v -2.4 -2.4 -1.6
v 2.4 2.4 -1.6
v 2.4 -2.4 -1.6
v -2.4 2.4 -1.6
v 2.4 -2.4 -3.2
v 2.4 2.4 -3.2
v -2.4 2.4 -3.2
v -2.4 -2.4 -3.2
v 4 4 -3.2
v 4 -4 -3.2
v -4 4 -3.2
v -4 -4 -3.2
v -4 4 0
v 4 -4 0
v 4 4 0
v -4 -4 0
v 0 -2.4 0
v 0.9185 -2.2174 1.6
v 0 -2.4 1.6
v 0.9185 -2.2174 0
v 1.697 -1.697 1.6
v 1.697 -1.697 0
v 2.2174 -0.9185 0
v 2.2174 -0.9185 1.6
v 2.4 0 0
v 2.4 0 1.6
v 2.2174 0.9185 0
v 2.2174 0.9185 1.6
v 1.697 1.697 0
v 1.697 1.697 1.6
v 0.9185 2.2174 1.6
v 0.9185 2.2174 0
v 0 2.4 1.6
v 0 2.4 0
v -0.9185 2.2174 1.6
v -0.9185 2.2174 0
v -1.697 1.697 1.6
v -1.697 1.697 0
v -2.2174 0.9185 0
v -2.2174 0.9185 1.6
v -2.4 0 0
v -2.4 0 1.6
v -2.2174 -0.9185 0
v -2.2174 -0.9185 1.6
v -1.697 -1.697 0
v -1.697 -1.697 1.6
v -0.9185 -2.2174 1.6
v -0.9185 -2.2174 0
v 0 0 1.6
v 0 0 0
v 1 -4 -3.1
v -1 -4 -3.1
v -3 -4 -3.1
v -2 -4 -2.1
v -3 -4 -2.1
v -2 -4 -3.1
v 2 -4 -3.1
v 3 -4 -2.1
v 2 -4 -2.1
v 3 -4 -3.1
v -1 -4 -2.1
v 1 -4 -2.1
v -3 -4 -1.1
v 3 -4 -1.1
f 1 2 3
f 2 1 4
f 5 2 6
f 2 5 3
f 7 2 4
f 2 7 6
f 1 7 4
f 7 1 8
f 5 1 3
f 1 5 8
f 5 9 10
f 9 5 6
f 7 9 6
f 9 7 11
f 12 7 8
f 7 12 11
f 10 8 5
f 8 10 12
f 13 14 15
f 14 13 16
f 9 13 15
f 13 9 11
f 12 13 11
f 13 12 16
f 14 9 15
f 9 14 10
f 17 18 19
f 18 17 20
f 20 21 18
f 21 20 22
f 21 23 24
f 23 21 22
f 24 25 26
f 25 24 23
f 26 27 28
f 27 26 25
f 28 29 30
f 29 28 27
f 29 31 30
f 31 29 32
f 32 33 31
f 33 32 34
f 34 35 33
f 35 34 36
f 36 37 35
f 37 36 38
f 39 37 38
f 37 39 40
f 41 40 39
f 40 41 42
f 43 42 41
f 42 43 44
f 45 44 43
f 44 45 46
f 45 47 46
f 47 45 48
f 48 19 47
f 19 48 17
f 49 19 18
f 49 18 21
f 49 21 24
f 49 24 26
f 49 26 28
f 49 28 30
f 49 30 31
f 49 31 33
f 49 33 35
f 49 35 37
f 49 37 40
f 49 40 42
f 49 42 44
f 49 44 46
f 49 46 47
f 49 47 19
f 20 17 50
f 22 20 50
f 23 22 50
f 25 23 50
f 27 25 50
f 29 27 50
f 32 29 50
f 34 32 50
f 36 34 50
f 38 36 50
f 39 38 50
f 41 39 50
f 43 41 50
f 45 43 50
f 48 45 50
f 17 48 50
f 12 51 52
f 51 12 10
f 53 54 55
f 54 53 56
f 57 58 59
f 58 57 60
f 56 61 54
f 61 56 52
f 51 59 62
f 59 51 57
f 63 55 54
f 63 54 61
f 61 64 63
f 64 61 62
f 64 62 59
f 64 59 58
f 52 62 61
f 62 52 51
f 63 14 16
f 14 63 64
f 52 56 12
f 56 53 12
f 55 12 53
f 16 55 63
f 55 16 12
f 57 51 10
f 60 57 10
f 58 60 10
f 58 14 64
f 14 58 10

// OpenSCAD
// file: ../p/4-4edge.scad
use <../lib.scad>
function ldraw_lib__4_4edge() = [
// 0 Circle 1.0
// 0 Name: 4-4edge.dat
// 0 Author: James Jessiman
// 0 !LDRAW_ORG Primitive UPDATE 2017-01
// 0 !LICENSE Licensed under CC BY 2.0 and CC BY 4.0 : see CAreadme.txt
// 
// 0 BFC CERTIFY CCW
  [0,"BFC","CERTIFY"],
  [0,"BFC","CCW"],
// 
// 0 !HISTORY 1998-12-15 [PTadmin] Official Update 1998-10
// 0 !HISTORY 2005-12-28 [PTadmin] Official Update 2005-01
// 0 !HISTORY 2007-06-24 [PTadmin] Header formatted for Contributor Agreement
// 0 !HISTORY 2008-07-01 [PTadmin] Official Update 2008-01
// 0 !HISTORY 2017-01-15 [Steffen] BFCed
// 0 !HISTORY 2017-12-30 [PTadmin] Official Update 2017-01
// 
// 
// 2 24 1 0 0 0.9239 0 0.3827
  [2,24,1,0,0,0.9239,0,0.3827],
// 2 24 0.9239 0 0.3827 0.7071 0 0.7071
  [2,24,0.9239,0,0.3827,0.7071,0,0.7071],
// 2 24 0.7071 0 0.7071 0.3827 0 0.9239
  [2,24,0.7071,0,0.7071,0.3827,0,0.9239],
// 2 24 0.3827 0 0.9239 0 0 1
  [2,24,0.3827,0,0.9239,0,0,1],
// 2 24 0 0 1 -0.3827 0 0.9239
  [2,24,0,0,1,-0.3827,0,0.9239],
// 2 24 -0.3827 0 0.9239 -0.7071 0 0.7071
  [2,24,-0.3827,0,0.9239,-0.7071,0,0.7071],
// 2 24 -0.7071 0 0.7071 -0.9239 0 0.3827
  [2,24,-0.7071,0,0.7071,-0.9239,0,0.3827],
// 2 24 -0.9239 0 0.3827 -1 0 -0
  [2,24,-0.9239,0,0.3827,-1,0,-0],
// 2 24 -1 0 -0 -0.9239 0 -0.3827
  [2,24,-1,0,-0,-0.9239,0,-0.3827],
// 2 24 -0.9239 0 -0.3827 -0.7071 0 -0.7071
  [2,24,-0.9239,0,-0.3827,-0.7071,0,-0.7071],
// 2 24 -0.7071 0 -0.7071 -0.3827 0 -0.9239
  [2,24,-0.7071,0,-0.7071,-0.3827,0,-0.9239],
// 2 24 -0.3827 0 -0.9239 0 0 -1
  [2,24,-0.3827,0,-0.9239,0,0,-1],
// 2 24 0 0 -1 0.3827 0 -0.9239
  [2,24,0,0,-1,0.3827,0,-0.9239],
// 2 24 0.3827 0 -0.9239 0.7071 0 -0.7071
  [2,24,0.3827,0,-0.9239,0.7071,0,-0.7071],
// 2 24 0.7071 0 -0.7071 0.9239 0 -0.3827
  [2,24,0.7071,0,-0.7071,0.9239,0,-0.3827],
// 2 24 0.9239 0 -0.3827 1 0 0
  [2,24,0.9239,0,-0.3827,1,0,0],
];
module ldraw_lib__4_4edge(step=0, col=false, unit=2/5, alt=false, line=0.2, solid=!$preview)
    makepoly(ldraw_lib__4_4edge(), step=step, col=col, unit=unit, alt=alt, line=line, solid=solid);
ldraw_lib__4_4edge(line=0.2);
// file: ../p/4-4disc.scad
use <../lib.scad>
function ldraw_lib__4_4disc() = [
// 0 Disc 1.0
// 0 Name: 4-4disc.dat
// 0 Author: James Jessiman
// 0 !LDRAW_ORG Primitive UPDATE 2002-02
// 0 !LICENSE Licensed under CC BY 2.0 and CC BY 4.0 : see CAreadme.txt
// 
// 0 BFC CERTIFY CCW
  [0,"BFC","CERTIFY"],
  [0,"BFC","CCW"],
// 
// 0 !HISTORY 1998-12-15 [PTadmin] Official Update 1998-10
// 0 !HISTORY 2002-03-23 [sbliss] Added BFC statement
// 0 !HISTORY 2002-04-25 [PTadmin] Official Update 2002-02
// 0 !HISTORY 2007-06-24 [PTadmin] Header formatted for Contributor Agreement
// 0 !HISTORY 2008-07-01 [PTadmin] Official Update 2008-01
// 
// 
// 3 16 0 0 0 1 0 0 0.9239 0 0.3827
  [3,16,0,0,0,1,0,0,0.9239,0,0.3827],
// 3 16 0 0 0 0.9239 0 0.3827 0.7071 0 0.7071
  [3,16,0,0,0,0.9239,0,0.3827,0.7071,0,0.7071],
// 3 16 0 0 0 0.7071 0 0.7071 0.3827 0 0.9239
  [3,16,0,0,0,0.7071,0,0.7071,0.3827,0,0.9239],
// 3 16 0 0 0 0.3827 0 0.9239 0 0 1
  [3,16,0,0,0,0.3827,0,0.9239,0,0,1],
// 3 16 0 0 0 0 0 1 -0.3827 0 0.9239
  [3,16,0,0,0,0,0,1,-0.3827,0,0.9239],
// 3 16 0 0 0 -0.3827 0 0.9239 -0.7071 0 0.7071
  [3,16,0,0,0,-0.3827,0,0.9239,-0.7071,0,0.7071],
// 3 16 0 0 0 -0.7071 0 0.7071 -0.9239 0 0.3827
  [3,16,0,0,0,-0.7071,0,0.7071,-0.9239,0,0.3827],
// 3 16 0 0 0 -0.9239 0 0.3827 -1 0 -0
  [3,16,0,0,0,-0.9239,0,0.3827,-1,0,-0],
// 3 16 0 0 0 -1 0 -0 -0.9239 0 -0.3827
  [3,16,0,0,0,-1,0,-0,-0.9239,0,-0.3827],
// 3 16 0 0 0 -0.9239 0 -0.3827 -0.7071 0 -0.7071
  [3,16,0,0,0,-0.9239,0,-0.3827,-0.7071,0,-0.7071],
// 3 16 0 0 0 -0.7071 0 -0.7071 -0.3827 0 -0.9239
  [3,16,0,0,0,-0.7071,0,-0.7071,-0.3827,0,-0.9239],
// 3 16 0 0 0 -0.3827 0 -0.9239 0 0 -1
  [3,16,0,0,0,-0.3827,0,-0.9239,0,0,-1],
// 3 16 0 0 0 0 0 -1 0.3827 0 -0.9239
  [3,16,0,0,0,0,0,-1,0.3827,0,-0.9239],
// 3 16 0 0 0 0.3827 0 -0.9239 0.7071 0 -0.7071
  [3,16,0,0,0,0.3827,0,-0.9239,0.7071,0,-0.7071],
// 3 16 0 0 0 0.7071 0 -0.7071 0.9239 0 -0.3827
  [3,16,0,0,0,0.7071,0,-0.7071,0.9239,0,-0.3827],
// 3 16 0 0 0 0.9239 0 -0.3827 1 0 0
  [3,16,0,0,0,0.9239,0,-0.3827,1,0,0],
// 0
];
module ldraw_lib__4_4disc(step=0, col=false, unit=2/5, alt=false, line=0.2, solid=!$preview)
    makepoly(ldraw_lib__4_4disc(), step=step, col=col, unit=unit, alt=alt, line=line, solid=solid);
ldraw_lib__4_4disc(line=0.2);
// file: ../p/4-4cyli.scad
use <../lib.scad>
$fa=1; $fs=0.2;
function ldraw_lib__4_4cyli(realsolid=false) = [
// 0 Cylinder 1.0
// 0 Name: 4-4cyli.dat
// 0 Author: James Jessiman
// 0 !LDRAW_ORG Primitive UPDATE 2005-01
// 0 !LICENSE Licensed under CC BY 2.0 and CC BY 4.0 : see CAreadme.txt
// 
// 0 BFC CERTIFY CCW
  [0,"BFC","CERTIFY"],
  [0,"BFC","CCW"],
// 
// 0 !HISTORY 1998-12-15 [PTadmin] Official Update 1998-10
// 0 !HISTORY 2002-03-23 [sbliss] Added BFC statement; merged headers from files in distributions LDraw 0.27 and Complete.
// 0 !HISTORY 2002-04-25 [PTadmin] Official Update 2002-02
// 0 !HISTORY 2004-12-14 [guyvivan] BFC CCW
// 0 !HISTORY 2005-12-28 [PTadmin] Official Update 2005-01
// 0 !HISTORY 2007-06-24 [PTadmin] Header formatted for Contributor Agreement
// 0 !HISTORY 2008-07-01 [PTadmin] Official Update 2008-01
// 
// 
// 4 16 1 1 0 0.9239 1 0.3827 0.9239 0 0.3827 1 0 0
  [4,16,1,1,0,0.9239,1,0.3827,0.9239,0,0.3827,1,0,0],
// 5 24 1 0 0 1 1 0 0.9239 0 0.3827 0.9239 0 -0.3827
  [5,24,1,0,0,1,1,0,0.9239,0,0.3827,0.9239,0,-0.3827],
// 4 16 0.9239 1 0.3827 0.7071 1 0.7071 0.7071 0 0.7071 0.9239 0 0.3827
  [4,16,0.9239,1,0.3827,0.7071,1,0.7071,0.7071,0,0.7071,0.9239,0,0.3827],
// 5 24 0.9239 0 0.3827 0.9239 1 0.3827 0.7071 0 0.7071 1 0 0
  [5,24,0.9239,0,0.3827,0.9239,1,0.3827,0.7071,0,0.7071,1,0,0],
// 4 16 0.7071 1 0.7071 0.3827 1 0.9239 0.3827 0 0.9239 0.7071 0 0.7071
  [4,16,0.7071,1,0.7071,0.3827,1,0.9239,0.3827,0,0.9239,0.7071,0,0.7071],
// 5 24 0.7071 0 0.7071 0.7071 1 0.7071 0.3827 0 0.9239 0.9239 0 0.3827
  [5,24,0.7071,0,0.7071,0.7071,1,0.7071,0.3827,0,0.9239,0.9239,0,0.3827],
// 4 16 0.3827 1 0.9239 0 1 1 0 0 1 0.3827 0 0.9239
  [4,16,0.3827,1,0.9239,0,1,1,0,0,1,0.3827,0,0.9239],
// 5 24 0.3827 0 0.9239 0.3827 1 0.9239 0 0 1 0.7071 0 0.7071
  [5,24,0.3827,0,0.9239,0.3827,1,0.9239,0,0,1,0.7071,0,0.7071],
// 4 16 0 1 1 -0.3827 1 0.9239 -0.3827 0 0.9239 0 0 1
  [4,16,0,1,1,-0.3827,1,0.9239,-0.3827,0,0.9239,0,0,1],
// 5 24 0 0 1 0 1 1 -0.3827 0 0.9239 0.3827 0 0.9239
  [5,24,0,0,1,0,1,1,-0.3827,0,0.9239,0.3827,0,0.9239],
// 4 16 -0.3827 1 0.9239 -0.7071 1 0.7071 -0.7071 0 0.7071 -0.3827 0 0.9239
  [4,16,-0.3827,1,0.9239,-0.7071,1,0.7071,-0.7071,0,0.7071,-0.3827,0,0.9239],
// 5 24 -0.3827 0 0.9239 -0.3827 1 0.9239 -0.7071 0 0.7071 0 0 1
  [5,24,-0.3827,0,0.9239,-0.3827,1,0.9239,-0.7071,0,0.7071,0,0,1],
// 4 16 -0.7071 1 0.7071 -0.9239 1 0.3827 -0.9239 0 0.3827 -0.7071 0 0.7071
  [4,16,-0.7071,1,0.7071,-0.9239,1,0.3827,-0.9239,0,0.3827,-0.7071,0,0.7071],
// 5 24 -0.7071 0 0.7071 -0.7071 1 0.7071 -0.9239 0 0.3827 -0.3827 0 0.9239
  [5,24,-0.7071,0,0.7071,-0.7071,1,0.7071,-0.9239,0,0.3827,-0.3827,0,0.9239],
// 4 16 -0.9239 1 0.3827 -1 1 0 -1 0 0 -0.9239 0 0.3827
  [4,16,-0.9239,1,0.3827,-1,1,0,-1,0,0,-0.9239,0,0.3827],
// 5 24 -0.9239 0 0.3827 -0.9239 1 0.3827 -1 0 0 -0.7071 0 0.7071
  [5,24,-0.9239,0,0.3827,-0.9239,1,0.3827,-1,0,0,-0.7071,0,0.7071],
// 4 16 -1 1 0 -0.9239 1 -0.3827 -0.9239 0 -0.3827 -1 0 0
  [4,16,-1,1,0,-0.9239,1,-0.3827,-0.9239,0,-0.3827,-1,0,0],
// 5 24 -1 0 0 -1 1 0 -0.9239 0 -0.3827 -0.9239 0 0.3827
  [5,24,-1,0,0,-1,1,0,-0.9239,0,-0.3827,-0.9239,0,0.3827],
// 4 16 -0.9239 1 -0.3827 -0.7071 1 -0.7071 -0.7071 0 -0.7071 -0.9239 0 -0.3827
  [4,16,-0.9239,1,-0.3827,-0.7071,1,-0.7071,-0.7071,0,-0.7071,-0.9239,0,-0.3827],
// 5 24 -0.9239 0 -0.3827 -0.9239 1 -0.3827 -0.7071 0 -0.7071 -1 0 0
  [5,24,-0.9239,0,-0.3827,-0.9239,1,-0.3827,-0.7071,0,-0.7071,-1,0,0],
// 4 16 -0.7071 1 -0.7071 -0.3827 1 -0.9239 -0.3827 0 -0.9239 -0.7071 0 -0.7071
  [4,16,-0.7071,1,-0.7071,-0.3827,1,-0.9239,-0.3827,0,-0.9239,-0.7071,0,-0.7071],
// 5 24 -0.7071 0 -0.7071 -0.7071 1 -0.7071 -0.3827 0 -0.9239 -0.9239 0 -0.3827
  [5,24,-0.7071,0,-0.7071,-0.7071,1,-0.7071,-0.3827,0,-0.9239,-0.9239,0,-0.3827],
// 4 16 -0.3827 1 -0.9239 0 1 -1 0 0 -1 -0.3827 0 -0.9239
  [4,16,-0.3827,1,-0.9239,0,1,-1,0,0,-1,-0.3827,0,-0.9239],
// 5 24 -0.3827 0 -0.9239 -0.3827 1 -0.9239 0 0 -1 -0.7071 0 -0.7071
  [5,24,-0.3827,0,-0.9239,-0.3827,1,-0.9239,0,0,-1,-0.7071,0,-0.7071],
// 4 16 0 1 -1 0.3827 1 -0.9239 0.3827 0 -0.9239 0 0 -1
  [4,16,0,1,-1,0.3827,1,-0.9239,0.3827,0,-0.9239,0,0,-1],
// 5 24 0 0 -1 0 1 -1 0.3827 0 -0.9239 -0.3827 0 -0.9239
  [5,24,0,0,-1,0,1,-1,0.3827,0,-0.9239,-0.3827,0,-0.9239],
// 4 16 0.3827 1 -0.9239 0.7071 1 -0.7071 0.7071 0 -0.7071 0.3827 0 -0.9239
  [4,16,0.3827,1,-0.9239,0.7071,1,-0.7071,0.7071,0,-0.7071,0.3827,0,-0.9239],
// 5 24 0.3827 0 -0.9239 0.3827 1 -0.9239 0.7071 0 -0.7071 0 0 -1
  [5,24,0.3827,0,-0.9239,0.3827,1,-0.9239,0.7071,0,-0.7071,0,0,-1],
// 4 16 0.7071 1 -0.7071 0.9239 1 -0.3827 0.9239 0 -0.3827 0.7071 0 -0.7071
  [4,16,0.7071,1,-0.7071,0.9239,1,-0.3827,0.9239,0,-0.3827,0.7071,0,-0.7071],
// 5 24 0.7071 0 -0.7071 0.7071 1 -0.7071 0.9239 0 -0.3827 0.3827 0 -0.9239
  [5,24,0.7071,0,-0.7071,0.7071,1,-0.7071,0.9239,0,-0.3827,0.3827,0,-0.9239],
// 4 16 0.9239 1 -0.3827 1 1 0 1 0 0 0.9239 0 -0.3827
  [4,16,0.9239,1,-0.3827,1,1,0,1,0,0,0.9239,0,-0.3827],
// 5 24 0.9239 0 -0.3827 0.9239 1 -0.3827 1 0 0 0.7071 0 -0.7071
  [5,24,0.9239,0,-0.3827,0.9239,1,-0.3827,1,0,0,0.7071,0,-0.7071],
// 0
];
module ldraw_lib__4_4cyli(step=0, col=false, unit=2/5, alt=false, line=0.2, solid=!$preview)
    makepoly(ldraw_lib__4_4cyli(solid), step=step, col=col, unit=unit, alt=alt, line=line, solid=solid);
ldraw_lib__4_4cyli(line=0.2);
// file: ../p/stud.scad
use <../lib.scad>
use <4-4cyli.scad>
use <4-4disc.scad>
use <4-4edge.scad>
function ldraw_lib__stud() = [
// 0 Stud
// 0 Name: stud.dat
// 0 Author: James Jessiman
// 0 !LDRAW_ORG Primitive UPDATE 2012-01
// 0 !LICENSE Licensed under CC BY 4.0 : see CAreadme.txt
// 
// 0 BFC CERTIFY CCW
  [0,"BFC","CERTIFY"],
  [0,"BFC","CCW"],
// 
// 0 !HISTORY 2002-04-04 [sbliss] Modified for BFC compliance
// 0 !HISTORY 2002-04-25 [PTadmin] Official Update 2002-02
// 0 !HISTORY 2007-06-24 [PTadmin] Header formatted for Contributor Agreement
// 0 !HISTORY 2008-07-01 [PTadmin] Official Update 2008-01
// 0 !HISTORY 2012-02-16 [Philo] Changed to CCW
// 0 !HISTORY 2012-03-30 [PTadmin] Official Update 2012-01
// 
// 
// 1 16 0 0 0 6 0 0 0 1 0 0 0 6 4-4edge.dat
  [1,16,0,0,0,6,0,0,0,1,0,0,0,6, ldraw_lib__4_4edge()],
// 1 16 0 -4 0 6 0 0 0 1 0 0 0 6 4-4edge.dat
  [1,16,0,-4,0,6,0,0,0,1,0,0,0,6, ldraw_lib__4_4edge()],
// 1 16 0 0 0 6 0 0 0 -4 0 0 0 6 4-4cyli.dat
  [1,16,0,0,0,6,0,0,0,-4,0,0,0,6, ldraw_lib__4_4cyli()],
// 1 16 0 -4 0 6 0 0 0 1 0 0 0 6 4-4disc.dat
  [1,16,0,-4,0,6,0,0,0,1,0,0,0,6, ldraw_lib__4_4disc()],
  [-1,16,0,0,0,6,0,0,0,-1,0,0,0,6, ldraw_lib__4_4disc()],
];
module ldraw_lib__stud(step=0, col=false, unit=2/5, alt=false, line=0.2, solid=!$preview)
    makepoly(ldraw_lib__stud(), step=step, col=col, unit=unit, alt=alt, line=line, solid=solid);
ldraw_lib__stud(line=0.2);
// file: ../p/box5.scad
use <../lib.scad>
function ldraw_lib__box5() = [
// 0 Box with 5 Faces and All Edges
// 0 Name: box5.dat
// 0 Author: James Jessiman
// 0 !LDRAW_ORG Primitive UPDATE 2012-01
// 0 !LICENSE Licensed under CC BY 2.0 and CC BY 4.0 : see CAreadme.txt
// 
// 0 BFC CERTIFY CCW
  [0,"BFC","CERTIFY"],
  [0,"BFC","CCW"],
// 
// 0 !HISTORY 2002-04-03 [sbliss] Modified for BFC compliance
// 0 !HISTORY 2002-04-25 [PTadmin] Official Update 2002-02
// 0 !HISTORY 2007-06-24 [PTadmin] Header formatted for Contributor Agreement
// 0 !HISTORY 2008-07-01 [PTadmin] Official Update 2008-01
// 0 !HISTORY 2012-02-16 [Philo] Changed to CCW
// 0 !HISTORY 2012-03-30 [PTadmin] Official Update 2012-01
// 
// 
// 2 24 1 1 1 -1 1 1
  [2,24,1,1,1,-1,1,1],
// 2 24 -1 1 1 -1 1 -1
  [2,24,-1,1,1,-1,1,-1],
// 2 24 -1 1 -1 1 1 -1
  [2,24,-1,1,-1,1,1,-1],
// 2 24 1 1 -1 1 1 1
  [2,24,1,1,-1,1,1,1],
// 2 24 1 0 1 -1 0 1
  [2,24,1,0,1,-1,0,1],
// 2 24 -1 0 1 -1 0 -1
  [2,24,-1,0,1,-1,0,-1],
// 2 24 -1 0 -1 1 0 -1
  [2,24,-1,0,-1,1,0,-1],
// 2 24 1 0 -1 1 0 1
  [2,24,1,0,-1,1,0,1],
// 2 24 1 0 1 1 1 1
  [2,24,1,0,1,1,1,1],
// 2 24 -1 0 1 -1 1 1
  [2,24,-1,0,1,-1,1,1],
// 2 24 1 0 -1 1 1 -1
  [2,24,1,0,-1,1,1,-1],
// 2 24 -1 0 -1 -1 1 -1
  [2,24,-1,0,-1,-1,1,-1],
// 4 16 -1 1 1 1 1 1 1 1 -1 -1 1 -1
  [4,16,-1,1,1,1,1,1,1,1,-1,-1,1,-1],
// 4 16 -1 1 1 -1 0 1 1 0 1 1 1 1
  [4,16,-1,1,1,-1,0,1,1,0,1,1,1,1],
// 4 16 -1 1 -1 -1 0 -1 -1 0 1 -1 1 1
  [4,16,-1,1,-1,-1,0,-1,-1,0,1,-1,1,1],
// 4 16 1 1 -1 1 0 -1 -1 0 -1 -1 1 -1
  [4,16,1,1,-1,1,0,-1,-1,0,-1,-1,1,-1],
// 4 16 1 1 1 1 0 1 1 0 -1 1 1 -1
  [4,16,1,1,1,1,0,1,1,0,-1,1,1,-1],
];
makepoly(ldraw_lib__box5(), line=0.2);
// file: ../p/box4t.scad
use <../lib.scad>
function ldraw_lib__box4t() = [
// 0 Box with 4 Adjacent Faces and All Edges
// 0 Name: box4t.dat
// 0 Author: Tore Eriksson [Tore_Eriksson]
// 0 !LDRAW_ORG Primitive UPDATE 2003-02
// 0 !LICENSE Licensed under CC BY 2.0 and CC BY 4.0 : see CAreadme.txt
// 
// 0 BFC CERTIFY CCW
  [0,"BFC","CERTIFY"],
  [0,"BFC","CCW"],
// 
// 0 !HISTORY 1997-09-29 [PTadmin] Official Update 1997-15
// 0 !HISTORY 2002-08-31 [izanette] Modified with WINDZ for BFC compliance
// 0 !HISTORY 2003-08-01 [PTadmin] Official Update 2003-02
// 0 !HISTORY 2007-06-24 [PTadmin] Header formatted for Contributor Agreement
// 0 !HISTORY 2008-07-01 [PTadmin] Official Update 2008-01
// 
// 
// 2 24 1 1 1 -1 1 1
  [2,24,1,1,1,-1,1,1],
// 2 24 -1 1 1 -1 1 -1
  [2,24,-1,1,1,-1,1,-1],
// 2 24 -1 1 -1 1 1 -1
  [2,24,-1,1,-1,1,1,-1],
// 2 24 1 1 -1 1 1 1
  [2,24,1,1,-1,1,1,1],
// 2 24 1 0 1 -1 0 1
  [2,24,1,0,1,-1,0,1],
// 2 24 -1 0 1 -1 0 -1
  [2,24,-1,0,1,-1,0,-1],
// 2 24 -1 0 -1 1 0 -1
  [2,24,-1,0,-1,1,0,-1],
// 2 24 1 0 -1 1 0 1
  [2,24,1,0,-1,1,0,1],
// 2 24 1 0 1 1 1 1
  [2,24,1,0,1,1,1,1],
// 2 24 -1 0 1 -1 1 1
  [2,24,-1,0,1,-1,1,1],
// 2 24 1 0 -1 1 1 -1
  [2,24,1,0,-1,1,1,-1],
// 2 24 -1 0 -1 -1 1 -1
  [2,24,-1,0,-1,-1,1,-1],
// 4 16 1 1 1 1 1 -1 -1 1 -1 -1 1 1
  [4,16,1,1,1,1,1,-1,-1,1,-1,-1,1,1],
// 4 16 1 1 1 -1 1 1 -1 0 1 1 0 1
  [4,16,1,1,1,-1,1,1,-1,0,1,1,0,1],
// 4 16 -1 1 1 -1 1 -1 -1 0 -1 -1 0 1
  [4,16,-1,1,1,-1,1,-1,-1,0,-1,-1,0,1],
// 0 4 16 -1 1 -1 -1 0 -1 1 0 -1 1 1 -1
// 4 16 1 1 -1 1 1 1 1 0 1 1 0 -1
  [4,16,1,1,-1,1,1,1,1,0,1,1,0,-1],
// 0
];
makepoly(ldraw_lib__box4t(), line=0.2);
// file: s/3024s01.scad
use <../../lib.scad>
use <../../p/box4t.scad>
use <../../p/box5.scad>
use <../../p/stud.scad>
function ldraw_lib__s__3024s01() = [
// 0 ~Plate  1 x  1 without Front Face
// 0 Name: s\3024s01.dat
// 0 Author: Tore Eriksson [Tore_Eriksson]
// 0 !LDRAW_ORG Subpart UPDATE 2012-03
// 0 !LICENSE Licensed under CC BY 2.0 and CC BY 4.0 : see CAreadme.txt
// 
// 0 BFC CERTIFY CCW
  [0,"BFC","CERTIFY"],
  [0,"BFC","CCW"],
// 
// 0 !HISTORY 2012-12-28 [PTadmin] Official Update 2012-03
// 
// 
// 0 BFC INVERTNEXT
  [0,"BFC","INVERTNEXT"],
// 1 16 0 8 0 0 0 6 0 -4 0 -6 0 0 box5.dat
  [1,16,0,8,0,0,0,6,0,-4,0,-6,0,0, ldraw_lib__box5()],
// 4 16 10 8 -10 6 8 -6 6 8 6 10 8 10
  [4,16,10,8,-10,6,8,-6,6,8,6,10,8,10],
// 4 16 10 8 10 6 8 6 -6 8 6 -10 8 10
  [4,16,10,8,10,6,8,6,-6,8,6,-10,8,10],
// 4 16 -10 8 10 -6 8 6 -6 8 -6 -10 8 -10
  [4,16,-10,8,10,-6,8,6,-6,8,-6,-10,8,-10],
// 4 16 -10 8 -10 -6 8 -6 6 8 -6 10 8 -10
  [4,16,-10,8,-10,-6,8,-6,6,8,-6,10,8,-10],
// 1 16 0 8 0 10 0 0 0 -8 0 0 0 10 box4t.dat
  [1,16,0,8,0,10,0,0,0,-8,0,0,0,10, ldraw_lib__box4t()],
// 1 16 0 0 0 0 0 1 0 1 0 -1 0 0 stud.dat
  [1,16,0,0,0,0,0,1,0,1,0,-1,0,0, ldraw_lib__stud()],
];
module ldraw_lib__s__3024s01(step=0, col=false, unit=2/5, alt=false, line=0.2, solid=!$preview)
    makepoly(ldraw_lib__s__3024s01(), step=step, col=col, unit=unit, alt=alt, line=line, solid=solid);
ldraw_lib__s__3024s01(line=0.2);
// main file
use <../lib.scad>
use <s/3024s01.scad>
function ldraw_lib__3024ptc6() = [
// 0 Plate  1 x  1 with Minecraft Micro Mob Villager Eyes Pattern
// 0 Name: 3024ptc6.dat
// 0 Author: Philippe Hurbain [Philo]
// 0 !LDRAW_ORG Part UPDATE 2014-01
// 0 !LICENSE Licensed under CC BY 4.0 : see CAreadme.txt
// 
// 0 BFC CERTIFY CCW
  [0,"BFC","CERTIFY"],
  [0,"BFC","CCW"],
// 
// 0 !KEYWORDS BrickLink 3024pb003, Rebrickable 3024pr0007
// 
// 0 !HISTORY 2014-06-21 [PTadmin] Official Update 2014-01
// 
// 
// 1 16 0 0 0 1 0 0 0 1 0 0 0 1 s\3024s01.dat
  [1,16,0,0,0,1,0,0,0,1,0,0,0,1, ldraw_lib__s__3024s01()],
// 4 16 10 8 -10 2.5 7.75 -10 -2.5 7.75 -10 -10 8 -10
  [4,16,10,8,-10,2.5,7.75,-10,-2.5,7.75,-10,-10,8,-10],
// 4 15 -5 5.25 -10 -7.5 5.25 -10 -7.5 7.75 -10 -5 7.75 -10
  [4,15,-5,5.25,-10,-7.5,5.25,-10,-7.5,7.75,-10,-5,7.75,-10],
// 4 15 7.5 5.25 -10 5 5.25 -10 5 7.75 -10 7.5 7.75 -10
  [4,15,7.5,5.25,-10,5,5.25,-10,5,7.75,-10,7.5,7.75,-10],
// 4 2 -2.5 5.25 -10 -5 5.25 -10 -5 7.75 -10 -2.5 7.75 -10
  [4,2,-2.5,5.25,-10,-5,5.25,-10,-5,7.75,-10,-2.5,7.75,-10],
// 4 2 5 5.25 -10 2.5 5.25 -10 2.5 7.75 -10 5 7.75 -10
  [4,2,5,5.25,-10,2.5,5.25,-10,2.5,7.75,-10,5,7.75,-10],
// 3 0 -7.5 2.75 -10 -7.5 5.25 -10 -5 5.25 -10
  [3,0,-7.5,2.75,-10,-7.5,5.25,-10,-5,5.25,-10],
// 3 0 -7.5 2.75 -10 -5 5.25 -10 -2.5 5.25 -10
  [3,0,-7.5,2.75,-10,-5,5.25,-10,-2.5,5.25,-10],
// 4 0 -7.5 2.75 -10 -2.5 5.25 -10 2.5 5.25 -10 7.5 2.75 -10
  [4,0,-7.5,2.75,-10,-2.5,5.25,-10,2.5,5.25,-10,7.5,2.75,-10],
// 3 0 7.5 2.75 -10 2.5 5.25 -10 5 5.25 -10
  [3,0,7.5,2.75,-10,2.5,5.25,-10,5,5.25,-10],
// 3 0 7.5 2.75 -10 5 5.25 -10 7.5 5.25 -10
  [3,0,7.5,2.75,-10,5,5.25,-10,7.5,5.25,-10],
// 4 16 2.5 5.25 -10 -2.5 5.25 -10 -2.5 7.75 -10 2.5 7.75 -10
  [4,16,2.5,5.25,-10,-2.5,5.25,-10,-2.5,7.75,-10,2.5,7.75,-10],
// 4 16 10 0 -10 -10 0 -10 -7.5 2.75 -10 7.5 2.75 -10
  [4,16,10,0,-10,-10,0,-10,-7.5,2.75,-10,7.5,2.75,-10],
// 3 16 -2.5 7.75 -10 -5 7.75 -10 -10 8 -10
  [3,16,-2.5,7.75,-10,-5,7.75,-10,-10,8,-10],
// 3 16 -5 7.75 -10 -7.5 7.75 -10 -10 8 -10
  [3,16,-5,7.75,-10,-7.5,7.75,-10,-10,8,-10],
// 3 16 -7.5 5.25 -10 -10 8 -10 -7.5 7.75 -10
  [3,16,-7.5,5.25,-10,-10,8,-10,-7.5,7.75,-10],
// 4 16 -10 8 -10 -7.5 5.25 -10 -7.5 2.75 -10 -10 0 -10
  [4,16,-10,8,-10,-7.5,5.25,-10,-7.5,2.75,-10,-10,0,-10],
// 3 16 5 7.75 -10 2.5 7.75 -10 10 8 -10
  [3,16,5,7.75,-10,2.5,7.75,-10,10,8,-10],
// 3 16 7.5 7.75 -10 5 7.75 -10 10 8 -10
  [3,16,7.5,7.75,-10,5,7.75,-10,10,8,-10],
// 3 16 7.5 5.25 -10 7.5 7.75 -10 10 8 -10
  [3,16,7.5,5.25,-10,7.5,7.75,-10,10,8,-10],
// 4 16 7.5 2.75 -10 7.5 5.25 -10 10 8 -10 10 0 -10
  [4,16,7.5,2.75,-10,7.5,5.25,-10,10,8,-10,10,0,-10],
];
module ldraw_lib__3024ptc6(step=0, col=false, unit=2/5, alt=false, line=0.2, solid=!$preview)
    makepoly(ldraw_lib__3024ptc6(), step=step, col=col, unit=unit, alt=alt, line=line, solid=solid);
ldraw_lib__3024ptc6(line=0.2);
